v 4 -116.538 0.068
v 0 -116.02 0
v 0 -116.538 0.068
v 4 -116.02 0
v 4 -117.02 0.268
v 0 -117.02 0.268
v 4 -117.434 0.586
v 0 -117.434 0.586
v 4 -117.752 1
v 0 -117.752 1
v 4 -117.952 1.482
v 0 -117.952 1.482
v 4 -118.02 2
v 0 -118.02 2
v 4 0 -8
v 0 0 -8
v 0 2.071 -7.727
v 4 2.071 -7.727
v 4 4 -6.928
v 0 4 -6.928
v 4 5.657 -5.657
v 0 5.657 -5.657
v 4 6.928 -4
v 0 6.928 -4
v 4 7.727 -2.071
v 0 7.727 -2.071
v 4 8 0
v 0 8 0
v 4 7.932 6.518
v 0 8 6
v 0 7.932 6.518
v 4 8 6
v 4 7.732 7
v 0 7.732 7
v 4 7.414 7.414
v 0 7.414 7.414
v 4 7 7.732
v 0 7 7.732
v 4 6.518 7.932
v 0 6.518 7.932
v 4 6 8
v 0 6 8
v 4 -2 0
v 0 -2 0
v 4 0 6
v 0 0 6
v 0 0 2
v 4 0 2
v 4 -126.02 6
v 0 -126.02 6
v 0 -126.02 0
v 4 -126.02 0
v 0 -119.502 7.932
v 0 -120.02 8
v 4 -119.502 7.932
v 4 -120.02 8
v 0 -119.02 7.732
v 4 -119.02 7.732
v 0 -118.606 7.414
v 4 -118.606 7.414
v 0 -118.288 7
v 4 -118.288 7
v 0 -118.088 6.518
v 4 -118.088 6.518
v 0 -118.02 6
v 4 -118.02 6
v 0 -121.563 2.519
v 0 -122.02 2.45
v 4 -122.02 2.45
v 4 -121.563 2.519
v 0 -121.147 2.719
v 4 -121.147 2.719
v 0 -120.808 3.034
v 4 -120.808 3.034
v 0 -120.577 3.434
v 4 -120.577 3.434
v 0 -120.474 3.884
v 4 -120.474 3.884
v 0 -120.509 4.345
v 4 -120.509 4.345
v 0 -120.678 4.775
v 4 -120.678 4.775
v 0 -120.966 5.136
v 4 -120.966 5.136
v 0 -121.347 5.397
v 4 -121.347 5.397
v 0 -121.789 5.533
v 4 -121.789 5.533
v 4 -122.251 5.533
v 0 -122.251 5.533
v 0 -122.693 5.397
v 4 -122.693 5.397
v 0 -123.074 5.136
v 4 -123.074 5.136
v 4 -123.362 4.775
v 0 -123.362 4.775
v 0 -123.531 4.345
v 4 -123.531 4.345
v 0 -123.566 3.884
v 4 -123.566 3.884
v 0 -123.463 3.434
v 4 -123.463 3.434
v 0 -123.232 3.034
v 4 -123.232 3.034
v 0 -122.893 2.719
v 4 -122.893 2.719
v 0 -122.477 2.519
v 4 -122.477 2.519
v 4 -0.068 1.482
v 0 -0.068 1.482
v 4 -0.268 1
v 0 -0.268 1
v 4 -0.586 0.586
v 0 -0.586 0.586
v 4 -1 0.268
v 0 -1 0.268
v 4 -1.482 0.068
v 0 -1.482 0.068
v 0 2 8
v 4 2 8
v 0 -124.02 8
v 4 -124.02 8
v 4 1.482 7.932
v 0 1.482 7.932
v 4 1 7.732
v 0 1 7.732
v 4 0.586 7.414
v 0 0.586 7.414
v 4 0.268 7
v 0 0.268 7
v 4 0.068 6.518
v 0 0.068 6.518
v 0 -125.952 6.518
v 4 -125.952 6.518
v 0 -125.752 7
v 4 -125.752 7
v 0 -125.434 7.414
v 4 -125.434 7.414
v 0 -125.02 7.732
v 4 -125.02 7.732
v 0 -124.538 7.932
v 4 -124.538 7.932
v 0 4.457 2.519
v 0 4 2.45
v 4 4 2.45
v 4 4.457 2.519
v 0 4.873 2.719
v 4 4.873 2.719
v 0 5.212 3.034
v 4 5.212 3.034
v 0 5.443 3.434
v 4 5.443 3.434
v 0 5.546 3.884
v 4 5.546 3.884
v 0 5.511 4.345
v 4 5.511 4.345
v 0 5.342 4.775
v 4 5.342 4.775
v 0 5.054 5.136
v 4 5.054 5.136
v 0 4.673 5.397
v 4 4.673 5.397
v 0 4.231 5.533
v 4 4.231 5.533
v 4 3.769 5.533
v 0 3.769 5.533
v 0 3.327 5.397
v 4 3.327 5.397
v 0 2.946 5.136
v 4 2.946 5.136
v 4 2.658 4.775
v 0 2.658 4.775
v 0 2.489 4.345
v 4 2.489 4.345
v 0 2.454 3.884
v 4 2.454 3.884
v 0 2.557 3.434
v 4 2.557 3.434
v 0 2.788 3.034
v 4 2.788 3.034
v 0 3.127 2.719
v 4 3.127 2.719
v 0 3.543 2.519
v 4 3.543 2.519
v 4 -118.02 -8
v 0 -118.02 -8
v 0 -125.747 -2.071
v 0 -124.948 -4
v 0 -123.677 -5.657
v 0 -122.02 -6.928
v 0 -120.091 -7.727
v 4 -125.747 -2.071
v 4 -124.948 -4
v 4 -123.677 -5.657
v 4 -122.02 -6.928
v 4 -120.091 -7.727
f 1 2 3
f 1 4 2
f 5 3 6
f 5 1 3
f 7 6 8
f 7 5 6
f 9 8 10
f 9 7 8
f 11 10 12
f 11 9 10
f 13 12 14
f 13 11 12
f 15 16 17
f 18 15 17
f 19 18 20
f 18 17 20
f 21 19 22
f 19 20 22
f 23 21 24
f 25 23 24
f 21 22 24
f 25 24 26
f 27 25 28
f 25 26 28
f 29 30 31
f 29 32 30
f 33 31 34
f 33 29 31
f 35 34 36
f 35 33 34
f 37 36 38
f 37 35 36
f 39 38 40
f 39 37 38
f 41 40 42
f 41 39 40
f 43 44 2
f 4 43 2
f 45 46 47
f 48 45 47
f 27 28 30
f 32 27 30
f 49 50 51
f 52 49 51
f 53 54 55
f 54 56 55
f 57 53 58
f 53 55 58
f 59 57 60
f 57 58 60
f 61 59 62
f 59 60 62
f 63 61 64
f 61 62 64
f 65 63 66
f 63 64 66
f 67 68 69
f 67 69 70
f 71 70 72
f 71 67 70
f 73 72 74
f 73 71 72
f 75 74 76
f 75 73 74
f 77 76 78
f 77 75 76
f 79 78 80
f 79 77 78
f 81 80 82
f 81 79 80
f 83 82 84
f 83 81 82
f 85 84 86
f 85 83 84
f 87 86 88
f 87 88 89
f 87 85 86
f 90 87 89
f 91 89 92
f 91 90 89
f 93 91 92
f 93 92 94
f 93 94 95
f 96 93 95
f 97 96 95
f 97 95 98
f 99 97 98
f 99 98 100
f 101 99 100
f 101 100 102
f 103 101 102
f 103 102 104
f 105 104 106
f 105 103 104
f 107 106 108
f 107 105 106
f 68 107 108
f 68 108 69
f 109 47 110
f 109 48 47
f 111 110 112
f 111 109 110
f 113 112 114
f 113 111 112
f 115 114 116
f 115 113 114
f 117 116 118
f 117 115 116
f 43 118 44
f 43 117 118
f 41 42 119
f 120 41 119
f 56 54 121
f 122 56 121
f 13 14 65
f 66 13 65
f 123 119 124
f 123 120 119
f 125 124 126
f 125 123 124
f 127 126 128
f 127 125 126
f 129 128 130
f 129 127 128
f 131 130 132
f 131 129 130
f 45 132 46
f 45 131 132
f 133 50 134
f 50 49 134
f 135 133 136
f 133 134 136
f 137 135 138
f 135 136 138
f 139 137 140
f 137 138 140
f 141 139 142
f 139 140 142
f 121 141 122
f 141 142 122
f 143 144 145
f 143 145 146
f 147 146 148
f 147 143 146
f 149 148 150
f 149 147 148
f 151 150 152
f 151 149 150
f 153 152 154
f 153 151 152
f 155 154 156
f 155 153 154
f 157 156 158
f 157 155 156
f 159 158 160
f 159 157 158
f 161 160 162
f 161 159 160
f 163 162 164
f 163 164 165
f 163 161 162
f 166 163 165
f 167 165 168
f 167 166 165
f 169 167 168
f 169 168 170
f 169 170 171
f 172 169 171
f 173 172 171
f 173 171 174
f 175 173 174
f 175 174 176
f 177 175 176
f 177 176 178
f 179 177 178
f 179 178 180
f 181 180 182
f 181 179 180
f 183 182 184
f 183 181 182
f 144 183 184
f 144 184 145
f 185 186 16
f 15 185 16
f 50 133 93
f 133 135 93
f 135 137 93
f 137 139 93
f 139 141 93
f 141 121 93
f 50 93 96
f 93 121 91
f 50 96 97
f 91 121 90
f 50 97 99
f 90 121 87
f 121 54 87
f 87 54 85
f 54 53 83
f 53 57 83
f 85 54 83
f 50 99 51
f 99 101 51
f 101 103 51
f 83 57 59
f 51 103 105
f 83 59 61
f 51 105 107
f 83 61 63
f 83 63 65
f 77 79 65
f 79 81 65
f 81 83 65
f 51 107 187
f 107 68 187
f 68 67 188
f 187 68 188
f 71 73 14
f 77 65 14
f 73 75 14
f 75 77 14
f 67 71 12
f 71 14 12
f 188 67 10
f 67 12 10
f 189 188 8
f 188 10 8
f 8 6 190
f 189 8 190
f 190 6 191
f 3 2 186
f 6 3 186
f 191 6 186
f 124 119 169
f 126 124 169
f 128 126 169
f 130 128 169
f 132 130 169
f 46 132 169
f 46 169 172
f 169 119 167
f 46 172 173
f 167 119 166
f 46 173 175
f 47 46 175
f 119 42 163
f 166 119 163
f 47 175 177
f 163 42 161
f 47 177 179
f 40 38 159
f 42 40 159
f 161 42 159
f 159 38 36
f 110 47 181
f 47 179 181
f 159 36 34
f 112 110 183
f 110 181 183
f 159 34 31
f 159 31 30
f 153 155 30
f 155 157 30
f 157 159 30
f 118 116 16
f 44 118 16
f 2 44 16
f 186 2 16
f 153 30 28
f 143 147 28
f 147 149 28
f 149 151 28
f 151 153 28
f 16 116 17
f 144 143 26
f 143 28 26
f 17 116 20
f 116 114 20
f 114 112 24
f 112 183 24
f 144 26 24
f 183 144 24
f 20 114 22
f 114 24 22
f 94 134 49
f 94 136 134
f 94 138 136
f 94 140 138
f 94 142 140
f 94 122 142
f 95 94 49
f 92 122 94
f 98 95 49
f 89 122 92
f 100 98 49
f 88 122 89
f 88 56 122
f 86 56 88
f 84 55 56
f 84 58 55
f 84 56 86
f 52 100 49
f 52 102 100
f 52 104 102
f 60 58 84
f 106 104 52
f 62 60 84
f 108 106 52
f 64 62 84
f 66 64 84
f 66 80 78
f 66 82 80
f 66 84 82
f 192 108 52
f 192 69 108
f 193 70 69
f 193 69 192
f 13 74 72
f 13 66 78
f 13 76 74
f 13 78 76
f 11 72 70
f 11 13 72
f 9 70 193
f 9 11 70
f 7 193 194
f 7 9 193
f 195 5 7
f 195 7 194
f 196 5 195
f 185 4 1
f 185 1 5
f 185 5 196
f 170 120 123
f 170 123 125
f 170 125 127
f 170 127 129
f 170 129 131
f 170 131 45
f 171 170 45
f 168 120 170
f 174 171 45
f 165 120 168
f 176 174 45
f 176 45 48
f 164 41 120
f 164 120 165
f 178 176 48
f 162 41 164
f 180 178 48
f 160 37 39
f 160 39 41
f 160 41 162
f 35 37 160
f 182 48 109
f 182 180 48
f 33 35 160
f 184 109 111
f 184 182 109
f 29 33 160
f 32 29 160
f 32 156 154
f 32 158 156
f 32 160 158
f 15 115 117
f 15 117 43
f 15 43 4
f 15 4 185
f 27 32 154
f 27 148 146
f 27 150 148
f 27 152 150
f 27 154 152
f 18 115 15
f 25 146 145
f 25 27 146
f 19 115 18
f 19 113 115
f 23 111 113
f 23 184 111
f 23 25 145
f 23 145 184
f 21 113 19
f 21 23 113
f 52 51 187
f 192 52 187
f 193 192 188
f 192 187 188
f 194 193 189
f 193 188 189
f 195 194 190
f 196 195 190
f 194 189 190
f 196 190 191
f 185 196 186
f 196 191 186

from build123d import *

# Parameters (mm, degrees)
SKETCH_1_R      = 1.55
EXTRUDE_1_DEPTH = 4
FILLET_1_R      = 2


with BuildPart() as part:
    # 草图1 → 凸台-拉伸1 (new body)
    with BuildSketch(Plane(origin=(0, 0, 0), x_dir=(0, 0, -1), z_dir=(1, 0, 0))):
        with BuildLine():
            ThreePointArc((8, 0), (5.656854249, 5.656854249), (0, 8))
            Line((0, 8), (-8, 8))
            Line((-8, 8), (-8, 0))
            Line((-8, 0), (0, 0))
            Line((0, 0), (0, -118.02))
            Line((0, -118.02), (-8, -118.02))
            Line((-8, -118.02), (-8, -126.02))
            Line((-8, -126.02), (0, -126.02))
            ThreePointArc((0, -126.02), (5.656854249, -123.676854249), (8, -118.02))
            Line((8, -118.02), (8, 0))
        make_face()
        with Locations((-4, 4)):
            Circle(SKETCH_1_R, mode=Mode.SUBTRACT)
        with Locations((-4, -122.02)):
            Circle(SKETCH_1_R, mode=Mode.SUBTRACT)
    extrude(amount=EXTRUDE_1_DEPTH)

    # 圆角1
    fillet_1_edges = [part.edges().sort_by_distance(p)[0] for p in [
        (2, -126.02, 8),
        (2, -118.02, 8),
        (2, -118.02, 0),
        (2, 0, 0),
        (2, 0, 8),
        (2, 8, 8),
    ]]
    fillet(fillet_1_edges, radius=FILLET_1_R)


solid = part.part
